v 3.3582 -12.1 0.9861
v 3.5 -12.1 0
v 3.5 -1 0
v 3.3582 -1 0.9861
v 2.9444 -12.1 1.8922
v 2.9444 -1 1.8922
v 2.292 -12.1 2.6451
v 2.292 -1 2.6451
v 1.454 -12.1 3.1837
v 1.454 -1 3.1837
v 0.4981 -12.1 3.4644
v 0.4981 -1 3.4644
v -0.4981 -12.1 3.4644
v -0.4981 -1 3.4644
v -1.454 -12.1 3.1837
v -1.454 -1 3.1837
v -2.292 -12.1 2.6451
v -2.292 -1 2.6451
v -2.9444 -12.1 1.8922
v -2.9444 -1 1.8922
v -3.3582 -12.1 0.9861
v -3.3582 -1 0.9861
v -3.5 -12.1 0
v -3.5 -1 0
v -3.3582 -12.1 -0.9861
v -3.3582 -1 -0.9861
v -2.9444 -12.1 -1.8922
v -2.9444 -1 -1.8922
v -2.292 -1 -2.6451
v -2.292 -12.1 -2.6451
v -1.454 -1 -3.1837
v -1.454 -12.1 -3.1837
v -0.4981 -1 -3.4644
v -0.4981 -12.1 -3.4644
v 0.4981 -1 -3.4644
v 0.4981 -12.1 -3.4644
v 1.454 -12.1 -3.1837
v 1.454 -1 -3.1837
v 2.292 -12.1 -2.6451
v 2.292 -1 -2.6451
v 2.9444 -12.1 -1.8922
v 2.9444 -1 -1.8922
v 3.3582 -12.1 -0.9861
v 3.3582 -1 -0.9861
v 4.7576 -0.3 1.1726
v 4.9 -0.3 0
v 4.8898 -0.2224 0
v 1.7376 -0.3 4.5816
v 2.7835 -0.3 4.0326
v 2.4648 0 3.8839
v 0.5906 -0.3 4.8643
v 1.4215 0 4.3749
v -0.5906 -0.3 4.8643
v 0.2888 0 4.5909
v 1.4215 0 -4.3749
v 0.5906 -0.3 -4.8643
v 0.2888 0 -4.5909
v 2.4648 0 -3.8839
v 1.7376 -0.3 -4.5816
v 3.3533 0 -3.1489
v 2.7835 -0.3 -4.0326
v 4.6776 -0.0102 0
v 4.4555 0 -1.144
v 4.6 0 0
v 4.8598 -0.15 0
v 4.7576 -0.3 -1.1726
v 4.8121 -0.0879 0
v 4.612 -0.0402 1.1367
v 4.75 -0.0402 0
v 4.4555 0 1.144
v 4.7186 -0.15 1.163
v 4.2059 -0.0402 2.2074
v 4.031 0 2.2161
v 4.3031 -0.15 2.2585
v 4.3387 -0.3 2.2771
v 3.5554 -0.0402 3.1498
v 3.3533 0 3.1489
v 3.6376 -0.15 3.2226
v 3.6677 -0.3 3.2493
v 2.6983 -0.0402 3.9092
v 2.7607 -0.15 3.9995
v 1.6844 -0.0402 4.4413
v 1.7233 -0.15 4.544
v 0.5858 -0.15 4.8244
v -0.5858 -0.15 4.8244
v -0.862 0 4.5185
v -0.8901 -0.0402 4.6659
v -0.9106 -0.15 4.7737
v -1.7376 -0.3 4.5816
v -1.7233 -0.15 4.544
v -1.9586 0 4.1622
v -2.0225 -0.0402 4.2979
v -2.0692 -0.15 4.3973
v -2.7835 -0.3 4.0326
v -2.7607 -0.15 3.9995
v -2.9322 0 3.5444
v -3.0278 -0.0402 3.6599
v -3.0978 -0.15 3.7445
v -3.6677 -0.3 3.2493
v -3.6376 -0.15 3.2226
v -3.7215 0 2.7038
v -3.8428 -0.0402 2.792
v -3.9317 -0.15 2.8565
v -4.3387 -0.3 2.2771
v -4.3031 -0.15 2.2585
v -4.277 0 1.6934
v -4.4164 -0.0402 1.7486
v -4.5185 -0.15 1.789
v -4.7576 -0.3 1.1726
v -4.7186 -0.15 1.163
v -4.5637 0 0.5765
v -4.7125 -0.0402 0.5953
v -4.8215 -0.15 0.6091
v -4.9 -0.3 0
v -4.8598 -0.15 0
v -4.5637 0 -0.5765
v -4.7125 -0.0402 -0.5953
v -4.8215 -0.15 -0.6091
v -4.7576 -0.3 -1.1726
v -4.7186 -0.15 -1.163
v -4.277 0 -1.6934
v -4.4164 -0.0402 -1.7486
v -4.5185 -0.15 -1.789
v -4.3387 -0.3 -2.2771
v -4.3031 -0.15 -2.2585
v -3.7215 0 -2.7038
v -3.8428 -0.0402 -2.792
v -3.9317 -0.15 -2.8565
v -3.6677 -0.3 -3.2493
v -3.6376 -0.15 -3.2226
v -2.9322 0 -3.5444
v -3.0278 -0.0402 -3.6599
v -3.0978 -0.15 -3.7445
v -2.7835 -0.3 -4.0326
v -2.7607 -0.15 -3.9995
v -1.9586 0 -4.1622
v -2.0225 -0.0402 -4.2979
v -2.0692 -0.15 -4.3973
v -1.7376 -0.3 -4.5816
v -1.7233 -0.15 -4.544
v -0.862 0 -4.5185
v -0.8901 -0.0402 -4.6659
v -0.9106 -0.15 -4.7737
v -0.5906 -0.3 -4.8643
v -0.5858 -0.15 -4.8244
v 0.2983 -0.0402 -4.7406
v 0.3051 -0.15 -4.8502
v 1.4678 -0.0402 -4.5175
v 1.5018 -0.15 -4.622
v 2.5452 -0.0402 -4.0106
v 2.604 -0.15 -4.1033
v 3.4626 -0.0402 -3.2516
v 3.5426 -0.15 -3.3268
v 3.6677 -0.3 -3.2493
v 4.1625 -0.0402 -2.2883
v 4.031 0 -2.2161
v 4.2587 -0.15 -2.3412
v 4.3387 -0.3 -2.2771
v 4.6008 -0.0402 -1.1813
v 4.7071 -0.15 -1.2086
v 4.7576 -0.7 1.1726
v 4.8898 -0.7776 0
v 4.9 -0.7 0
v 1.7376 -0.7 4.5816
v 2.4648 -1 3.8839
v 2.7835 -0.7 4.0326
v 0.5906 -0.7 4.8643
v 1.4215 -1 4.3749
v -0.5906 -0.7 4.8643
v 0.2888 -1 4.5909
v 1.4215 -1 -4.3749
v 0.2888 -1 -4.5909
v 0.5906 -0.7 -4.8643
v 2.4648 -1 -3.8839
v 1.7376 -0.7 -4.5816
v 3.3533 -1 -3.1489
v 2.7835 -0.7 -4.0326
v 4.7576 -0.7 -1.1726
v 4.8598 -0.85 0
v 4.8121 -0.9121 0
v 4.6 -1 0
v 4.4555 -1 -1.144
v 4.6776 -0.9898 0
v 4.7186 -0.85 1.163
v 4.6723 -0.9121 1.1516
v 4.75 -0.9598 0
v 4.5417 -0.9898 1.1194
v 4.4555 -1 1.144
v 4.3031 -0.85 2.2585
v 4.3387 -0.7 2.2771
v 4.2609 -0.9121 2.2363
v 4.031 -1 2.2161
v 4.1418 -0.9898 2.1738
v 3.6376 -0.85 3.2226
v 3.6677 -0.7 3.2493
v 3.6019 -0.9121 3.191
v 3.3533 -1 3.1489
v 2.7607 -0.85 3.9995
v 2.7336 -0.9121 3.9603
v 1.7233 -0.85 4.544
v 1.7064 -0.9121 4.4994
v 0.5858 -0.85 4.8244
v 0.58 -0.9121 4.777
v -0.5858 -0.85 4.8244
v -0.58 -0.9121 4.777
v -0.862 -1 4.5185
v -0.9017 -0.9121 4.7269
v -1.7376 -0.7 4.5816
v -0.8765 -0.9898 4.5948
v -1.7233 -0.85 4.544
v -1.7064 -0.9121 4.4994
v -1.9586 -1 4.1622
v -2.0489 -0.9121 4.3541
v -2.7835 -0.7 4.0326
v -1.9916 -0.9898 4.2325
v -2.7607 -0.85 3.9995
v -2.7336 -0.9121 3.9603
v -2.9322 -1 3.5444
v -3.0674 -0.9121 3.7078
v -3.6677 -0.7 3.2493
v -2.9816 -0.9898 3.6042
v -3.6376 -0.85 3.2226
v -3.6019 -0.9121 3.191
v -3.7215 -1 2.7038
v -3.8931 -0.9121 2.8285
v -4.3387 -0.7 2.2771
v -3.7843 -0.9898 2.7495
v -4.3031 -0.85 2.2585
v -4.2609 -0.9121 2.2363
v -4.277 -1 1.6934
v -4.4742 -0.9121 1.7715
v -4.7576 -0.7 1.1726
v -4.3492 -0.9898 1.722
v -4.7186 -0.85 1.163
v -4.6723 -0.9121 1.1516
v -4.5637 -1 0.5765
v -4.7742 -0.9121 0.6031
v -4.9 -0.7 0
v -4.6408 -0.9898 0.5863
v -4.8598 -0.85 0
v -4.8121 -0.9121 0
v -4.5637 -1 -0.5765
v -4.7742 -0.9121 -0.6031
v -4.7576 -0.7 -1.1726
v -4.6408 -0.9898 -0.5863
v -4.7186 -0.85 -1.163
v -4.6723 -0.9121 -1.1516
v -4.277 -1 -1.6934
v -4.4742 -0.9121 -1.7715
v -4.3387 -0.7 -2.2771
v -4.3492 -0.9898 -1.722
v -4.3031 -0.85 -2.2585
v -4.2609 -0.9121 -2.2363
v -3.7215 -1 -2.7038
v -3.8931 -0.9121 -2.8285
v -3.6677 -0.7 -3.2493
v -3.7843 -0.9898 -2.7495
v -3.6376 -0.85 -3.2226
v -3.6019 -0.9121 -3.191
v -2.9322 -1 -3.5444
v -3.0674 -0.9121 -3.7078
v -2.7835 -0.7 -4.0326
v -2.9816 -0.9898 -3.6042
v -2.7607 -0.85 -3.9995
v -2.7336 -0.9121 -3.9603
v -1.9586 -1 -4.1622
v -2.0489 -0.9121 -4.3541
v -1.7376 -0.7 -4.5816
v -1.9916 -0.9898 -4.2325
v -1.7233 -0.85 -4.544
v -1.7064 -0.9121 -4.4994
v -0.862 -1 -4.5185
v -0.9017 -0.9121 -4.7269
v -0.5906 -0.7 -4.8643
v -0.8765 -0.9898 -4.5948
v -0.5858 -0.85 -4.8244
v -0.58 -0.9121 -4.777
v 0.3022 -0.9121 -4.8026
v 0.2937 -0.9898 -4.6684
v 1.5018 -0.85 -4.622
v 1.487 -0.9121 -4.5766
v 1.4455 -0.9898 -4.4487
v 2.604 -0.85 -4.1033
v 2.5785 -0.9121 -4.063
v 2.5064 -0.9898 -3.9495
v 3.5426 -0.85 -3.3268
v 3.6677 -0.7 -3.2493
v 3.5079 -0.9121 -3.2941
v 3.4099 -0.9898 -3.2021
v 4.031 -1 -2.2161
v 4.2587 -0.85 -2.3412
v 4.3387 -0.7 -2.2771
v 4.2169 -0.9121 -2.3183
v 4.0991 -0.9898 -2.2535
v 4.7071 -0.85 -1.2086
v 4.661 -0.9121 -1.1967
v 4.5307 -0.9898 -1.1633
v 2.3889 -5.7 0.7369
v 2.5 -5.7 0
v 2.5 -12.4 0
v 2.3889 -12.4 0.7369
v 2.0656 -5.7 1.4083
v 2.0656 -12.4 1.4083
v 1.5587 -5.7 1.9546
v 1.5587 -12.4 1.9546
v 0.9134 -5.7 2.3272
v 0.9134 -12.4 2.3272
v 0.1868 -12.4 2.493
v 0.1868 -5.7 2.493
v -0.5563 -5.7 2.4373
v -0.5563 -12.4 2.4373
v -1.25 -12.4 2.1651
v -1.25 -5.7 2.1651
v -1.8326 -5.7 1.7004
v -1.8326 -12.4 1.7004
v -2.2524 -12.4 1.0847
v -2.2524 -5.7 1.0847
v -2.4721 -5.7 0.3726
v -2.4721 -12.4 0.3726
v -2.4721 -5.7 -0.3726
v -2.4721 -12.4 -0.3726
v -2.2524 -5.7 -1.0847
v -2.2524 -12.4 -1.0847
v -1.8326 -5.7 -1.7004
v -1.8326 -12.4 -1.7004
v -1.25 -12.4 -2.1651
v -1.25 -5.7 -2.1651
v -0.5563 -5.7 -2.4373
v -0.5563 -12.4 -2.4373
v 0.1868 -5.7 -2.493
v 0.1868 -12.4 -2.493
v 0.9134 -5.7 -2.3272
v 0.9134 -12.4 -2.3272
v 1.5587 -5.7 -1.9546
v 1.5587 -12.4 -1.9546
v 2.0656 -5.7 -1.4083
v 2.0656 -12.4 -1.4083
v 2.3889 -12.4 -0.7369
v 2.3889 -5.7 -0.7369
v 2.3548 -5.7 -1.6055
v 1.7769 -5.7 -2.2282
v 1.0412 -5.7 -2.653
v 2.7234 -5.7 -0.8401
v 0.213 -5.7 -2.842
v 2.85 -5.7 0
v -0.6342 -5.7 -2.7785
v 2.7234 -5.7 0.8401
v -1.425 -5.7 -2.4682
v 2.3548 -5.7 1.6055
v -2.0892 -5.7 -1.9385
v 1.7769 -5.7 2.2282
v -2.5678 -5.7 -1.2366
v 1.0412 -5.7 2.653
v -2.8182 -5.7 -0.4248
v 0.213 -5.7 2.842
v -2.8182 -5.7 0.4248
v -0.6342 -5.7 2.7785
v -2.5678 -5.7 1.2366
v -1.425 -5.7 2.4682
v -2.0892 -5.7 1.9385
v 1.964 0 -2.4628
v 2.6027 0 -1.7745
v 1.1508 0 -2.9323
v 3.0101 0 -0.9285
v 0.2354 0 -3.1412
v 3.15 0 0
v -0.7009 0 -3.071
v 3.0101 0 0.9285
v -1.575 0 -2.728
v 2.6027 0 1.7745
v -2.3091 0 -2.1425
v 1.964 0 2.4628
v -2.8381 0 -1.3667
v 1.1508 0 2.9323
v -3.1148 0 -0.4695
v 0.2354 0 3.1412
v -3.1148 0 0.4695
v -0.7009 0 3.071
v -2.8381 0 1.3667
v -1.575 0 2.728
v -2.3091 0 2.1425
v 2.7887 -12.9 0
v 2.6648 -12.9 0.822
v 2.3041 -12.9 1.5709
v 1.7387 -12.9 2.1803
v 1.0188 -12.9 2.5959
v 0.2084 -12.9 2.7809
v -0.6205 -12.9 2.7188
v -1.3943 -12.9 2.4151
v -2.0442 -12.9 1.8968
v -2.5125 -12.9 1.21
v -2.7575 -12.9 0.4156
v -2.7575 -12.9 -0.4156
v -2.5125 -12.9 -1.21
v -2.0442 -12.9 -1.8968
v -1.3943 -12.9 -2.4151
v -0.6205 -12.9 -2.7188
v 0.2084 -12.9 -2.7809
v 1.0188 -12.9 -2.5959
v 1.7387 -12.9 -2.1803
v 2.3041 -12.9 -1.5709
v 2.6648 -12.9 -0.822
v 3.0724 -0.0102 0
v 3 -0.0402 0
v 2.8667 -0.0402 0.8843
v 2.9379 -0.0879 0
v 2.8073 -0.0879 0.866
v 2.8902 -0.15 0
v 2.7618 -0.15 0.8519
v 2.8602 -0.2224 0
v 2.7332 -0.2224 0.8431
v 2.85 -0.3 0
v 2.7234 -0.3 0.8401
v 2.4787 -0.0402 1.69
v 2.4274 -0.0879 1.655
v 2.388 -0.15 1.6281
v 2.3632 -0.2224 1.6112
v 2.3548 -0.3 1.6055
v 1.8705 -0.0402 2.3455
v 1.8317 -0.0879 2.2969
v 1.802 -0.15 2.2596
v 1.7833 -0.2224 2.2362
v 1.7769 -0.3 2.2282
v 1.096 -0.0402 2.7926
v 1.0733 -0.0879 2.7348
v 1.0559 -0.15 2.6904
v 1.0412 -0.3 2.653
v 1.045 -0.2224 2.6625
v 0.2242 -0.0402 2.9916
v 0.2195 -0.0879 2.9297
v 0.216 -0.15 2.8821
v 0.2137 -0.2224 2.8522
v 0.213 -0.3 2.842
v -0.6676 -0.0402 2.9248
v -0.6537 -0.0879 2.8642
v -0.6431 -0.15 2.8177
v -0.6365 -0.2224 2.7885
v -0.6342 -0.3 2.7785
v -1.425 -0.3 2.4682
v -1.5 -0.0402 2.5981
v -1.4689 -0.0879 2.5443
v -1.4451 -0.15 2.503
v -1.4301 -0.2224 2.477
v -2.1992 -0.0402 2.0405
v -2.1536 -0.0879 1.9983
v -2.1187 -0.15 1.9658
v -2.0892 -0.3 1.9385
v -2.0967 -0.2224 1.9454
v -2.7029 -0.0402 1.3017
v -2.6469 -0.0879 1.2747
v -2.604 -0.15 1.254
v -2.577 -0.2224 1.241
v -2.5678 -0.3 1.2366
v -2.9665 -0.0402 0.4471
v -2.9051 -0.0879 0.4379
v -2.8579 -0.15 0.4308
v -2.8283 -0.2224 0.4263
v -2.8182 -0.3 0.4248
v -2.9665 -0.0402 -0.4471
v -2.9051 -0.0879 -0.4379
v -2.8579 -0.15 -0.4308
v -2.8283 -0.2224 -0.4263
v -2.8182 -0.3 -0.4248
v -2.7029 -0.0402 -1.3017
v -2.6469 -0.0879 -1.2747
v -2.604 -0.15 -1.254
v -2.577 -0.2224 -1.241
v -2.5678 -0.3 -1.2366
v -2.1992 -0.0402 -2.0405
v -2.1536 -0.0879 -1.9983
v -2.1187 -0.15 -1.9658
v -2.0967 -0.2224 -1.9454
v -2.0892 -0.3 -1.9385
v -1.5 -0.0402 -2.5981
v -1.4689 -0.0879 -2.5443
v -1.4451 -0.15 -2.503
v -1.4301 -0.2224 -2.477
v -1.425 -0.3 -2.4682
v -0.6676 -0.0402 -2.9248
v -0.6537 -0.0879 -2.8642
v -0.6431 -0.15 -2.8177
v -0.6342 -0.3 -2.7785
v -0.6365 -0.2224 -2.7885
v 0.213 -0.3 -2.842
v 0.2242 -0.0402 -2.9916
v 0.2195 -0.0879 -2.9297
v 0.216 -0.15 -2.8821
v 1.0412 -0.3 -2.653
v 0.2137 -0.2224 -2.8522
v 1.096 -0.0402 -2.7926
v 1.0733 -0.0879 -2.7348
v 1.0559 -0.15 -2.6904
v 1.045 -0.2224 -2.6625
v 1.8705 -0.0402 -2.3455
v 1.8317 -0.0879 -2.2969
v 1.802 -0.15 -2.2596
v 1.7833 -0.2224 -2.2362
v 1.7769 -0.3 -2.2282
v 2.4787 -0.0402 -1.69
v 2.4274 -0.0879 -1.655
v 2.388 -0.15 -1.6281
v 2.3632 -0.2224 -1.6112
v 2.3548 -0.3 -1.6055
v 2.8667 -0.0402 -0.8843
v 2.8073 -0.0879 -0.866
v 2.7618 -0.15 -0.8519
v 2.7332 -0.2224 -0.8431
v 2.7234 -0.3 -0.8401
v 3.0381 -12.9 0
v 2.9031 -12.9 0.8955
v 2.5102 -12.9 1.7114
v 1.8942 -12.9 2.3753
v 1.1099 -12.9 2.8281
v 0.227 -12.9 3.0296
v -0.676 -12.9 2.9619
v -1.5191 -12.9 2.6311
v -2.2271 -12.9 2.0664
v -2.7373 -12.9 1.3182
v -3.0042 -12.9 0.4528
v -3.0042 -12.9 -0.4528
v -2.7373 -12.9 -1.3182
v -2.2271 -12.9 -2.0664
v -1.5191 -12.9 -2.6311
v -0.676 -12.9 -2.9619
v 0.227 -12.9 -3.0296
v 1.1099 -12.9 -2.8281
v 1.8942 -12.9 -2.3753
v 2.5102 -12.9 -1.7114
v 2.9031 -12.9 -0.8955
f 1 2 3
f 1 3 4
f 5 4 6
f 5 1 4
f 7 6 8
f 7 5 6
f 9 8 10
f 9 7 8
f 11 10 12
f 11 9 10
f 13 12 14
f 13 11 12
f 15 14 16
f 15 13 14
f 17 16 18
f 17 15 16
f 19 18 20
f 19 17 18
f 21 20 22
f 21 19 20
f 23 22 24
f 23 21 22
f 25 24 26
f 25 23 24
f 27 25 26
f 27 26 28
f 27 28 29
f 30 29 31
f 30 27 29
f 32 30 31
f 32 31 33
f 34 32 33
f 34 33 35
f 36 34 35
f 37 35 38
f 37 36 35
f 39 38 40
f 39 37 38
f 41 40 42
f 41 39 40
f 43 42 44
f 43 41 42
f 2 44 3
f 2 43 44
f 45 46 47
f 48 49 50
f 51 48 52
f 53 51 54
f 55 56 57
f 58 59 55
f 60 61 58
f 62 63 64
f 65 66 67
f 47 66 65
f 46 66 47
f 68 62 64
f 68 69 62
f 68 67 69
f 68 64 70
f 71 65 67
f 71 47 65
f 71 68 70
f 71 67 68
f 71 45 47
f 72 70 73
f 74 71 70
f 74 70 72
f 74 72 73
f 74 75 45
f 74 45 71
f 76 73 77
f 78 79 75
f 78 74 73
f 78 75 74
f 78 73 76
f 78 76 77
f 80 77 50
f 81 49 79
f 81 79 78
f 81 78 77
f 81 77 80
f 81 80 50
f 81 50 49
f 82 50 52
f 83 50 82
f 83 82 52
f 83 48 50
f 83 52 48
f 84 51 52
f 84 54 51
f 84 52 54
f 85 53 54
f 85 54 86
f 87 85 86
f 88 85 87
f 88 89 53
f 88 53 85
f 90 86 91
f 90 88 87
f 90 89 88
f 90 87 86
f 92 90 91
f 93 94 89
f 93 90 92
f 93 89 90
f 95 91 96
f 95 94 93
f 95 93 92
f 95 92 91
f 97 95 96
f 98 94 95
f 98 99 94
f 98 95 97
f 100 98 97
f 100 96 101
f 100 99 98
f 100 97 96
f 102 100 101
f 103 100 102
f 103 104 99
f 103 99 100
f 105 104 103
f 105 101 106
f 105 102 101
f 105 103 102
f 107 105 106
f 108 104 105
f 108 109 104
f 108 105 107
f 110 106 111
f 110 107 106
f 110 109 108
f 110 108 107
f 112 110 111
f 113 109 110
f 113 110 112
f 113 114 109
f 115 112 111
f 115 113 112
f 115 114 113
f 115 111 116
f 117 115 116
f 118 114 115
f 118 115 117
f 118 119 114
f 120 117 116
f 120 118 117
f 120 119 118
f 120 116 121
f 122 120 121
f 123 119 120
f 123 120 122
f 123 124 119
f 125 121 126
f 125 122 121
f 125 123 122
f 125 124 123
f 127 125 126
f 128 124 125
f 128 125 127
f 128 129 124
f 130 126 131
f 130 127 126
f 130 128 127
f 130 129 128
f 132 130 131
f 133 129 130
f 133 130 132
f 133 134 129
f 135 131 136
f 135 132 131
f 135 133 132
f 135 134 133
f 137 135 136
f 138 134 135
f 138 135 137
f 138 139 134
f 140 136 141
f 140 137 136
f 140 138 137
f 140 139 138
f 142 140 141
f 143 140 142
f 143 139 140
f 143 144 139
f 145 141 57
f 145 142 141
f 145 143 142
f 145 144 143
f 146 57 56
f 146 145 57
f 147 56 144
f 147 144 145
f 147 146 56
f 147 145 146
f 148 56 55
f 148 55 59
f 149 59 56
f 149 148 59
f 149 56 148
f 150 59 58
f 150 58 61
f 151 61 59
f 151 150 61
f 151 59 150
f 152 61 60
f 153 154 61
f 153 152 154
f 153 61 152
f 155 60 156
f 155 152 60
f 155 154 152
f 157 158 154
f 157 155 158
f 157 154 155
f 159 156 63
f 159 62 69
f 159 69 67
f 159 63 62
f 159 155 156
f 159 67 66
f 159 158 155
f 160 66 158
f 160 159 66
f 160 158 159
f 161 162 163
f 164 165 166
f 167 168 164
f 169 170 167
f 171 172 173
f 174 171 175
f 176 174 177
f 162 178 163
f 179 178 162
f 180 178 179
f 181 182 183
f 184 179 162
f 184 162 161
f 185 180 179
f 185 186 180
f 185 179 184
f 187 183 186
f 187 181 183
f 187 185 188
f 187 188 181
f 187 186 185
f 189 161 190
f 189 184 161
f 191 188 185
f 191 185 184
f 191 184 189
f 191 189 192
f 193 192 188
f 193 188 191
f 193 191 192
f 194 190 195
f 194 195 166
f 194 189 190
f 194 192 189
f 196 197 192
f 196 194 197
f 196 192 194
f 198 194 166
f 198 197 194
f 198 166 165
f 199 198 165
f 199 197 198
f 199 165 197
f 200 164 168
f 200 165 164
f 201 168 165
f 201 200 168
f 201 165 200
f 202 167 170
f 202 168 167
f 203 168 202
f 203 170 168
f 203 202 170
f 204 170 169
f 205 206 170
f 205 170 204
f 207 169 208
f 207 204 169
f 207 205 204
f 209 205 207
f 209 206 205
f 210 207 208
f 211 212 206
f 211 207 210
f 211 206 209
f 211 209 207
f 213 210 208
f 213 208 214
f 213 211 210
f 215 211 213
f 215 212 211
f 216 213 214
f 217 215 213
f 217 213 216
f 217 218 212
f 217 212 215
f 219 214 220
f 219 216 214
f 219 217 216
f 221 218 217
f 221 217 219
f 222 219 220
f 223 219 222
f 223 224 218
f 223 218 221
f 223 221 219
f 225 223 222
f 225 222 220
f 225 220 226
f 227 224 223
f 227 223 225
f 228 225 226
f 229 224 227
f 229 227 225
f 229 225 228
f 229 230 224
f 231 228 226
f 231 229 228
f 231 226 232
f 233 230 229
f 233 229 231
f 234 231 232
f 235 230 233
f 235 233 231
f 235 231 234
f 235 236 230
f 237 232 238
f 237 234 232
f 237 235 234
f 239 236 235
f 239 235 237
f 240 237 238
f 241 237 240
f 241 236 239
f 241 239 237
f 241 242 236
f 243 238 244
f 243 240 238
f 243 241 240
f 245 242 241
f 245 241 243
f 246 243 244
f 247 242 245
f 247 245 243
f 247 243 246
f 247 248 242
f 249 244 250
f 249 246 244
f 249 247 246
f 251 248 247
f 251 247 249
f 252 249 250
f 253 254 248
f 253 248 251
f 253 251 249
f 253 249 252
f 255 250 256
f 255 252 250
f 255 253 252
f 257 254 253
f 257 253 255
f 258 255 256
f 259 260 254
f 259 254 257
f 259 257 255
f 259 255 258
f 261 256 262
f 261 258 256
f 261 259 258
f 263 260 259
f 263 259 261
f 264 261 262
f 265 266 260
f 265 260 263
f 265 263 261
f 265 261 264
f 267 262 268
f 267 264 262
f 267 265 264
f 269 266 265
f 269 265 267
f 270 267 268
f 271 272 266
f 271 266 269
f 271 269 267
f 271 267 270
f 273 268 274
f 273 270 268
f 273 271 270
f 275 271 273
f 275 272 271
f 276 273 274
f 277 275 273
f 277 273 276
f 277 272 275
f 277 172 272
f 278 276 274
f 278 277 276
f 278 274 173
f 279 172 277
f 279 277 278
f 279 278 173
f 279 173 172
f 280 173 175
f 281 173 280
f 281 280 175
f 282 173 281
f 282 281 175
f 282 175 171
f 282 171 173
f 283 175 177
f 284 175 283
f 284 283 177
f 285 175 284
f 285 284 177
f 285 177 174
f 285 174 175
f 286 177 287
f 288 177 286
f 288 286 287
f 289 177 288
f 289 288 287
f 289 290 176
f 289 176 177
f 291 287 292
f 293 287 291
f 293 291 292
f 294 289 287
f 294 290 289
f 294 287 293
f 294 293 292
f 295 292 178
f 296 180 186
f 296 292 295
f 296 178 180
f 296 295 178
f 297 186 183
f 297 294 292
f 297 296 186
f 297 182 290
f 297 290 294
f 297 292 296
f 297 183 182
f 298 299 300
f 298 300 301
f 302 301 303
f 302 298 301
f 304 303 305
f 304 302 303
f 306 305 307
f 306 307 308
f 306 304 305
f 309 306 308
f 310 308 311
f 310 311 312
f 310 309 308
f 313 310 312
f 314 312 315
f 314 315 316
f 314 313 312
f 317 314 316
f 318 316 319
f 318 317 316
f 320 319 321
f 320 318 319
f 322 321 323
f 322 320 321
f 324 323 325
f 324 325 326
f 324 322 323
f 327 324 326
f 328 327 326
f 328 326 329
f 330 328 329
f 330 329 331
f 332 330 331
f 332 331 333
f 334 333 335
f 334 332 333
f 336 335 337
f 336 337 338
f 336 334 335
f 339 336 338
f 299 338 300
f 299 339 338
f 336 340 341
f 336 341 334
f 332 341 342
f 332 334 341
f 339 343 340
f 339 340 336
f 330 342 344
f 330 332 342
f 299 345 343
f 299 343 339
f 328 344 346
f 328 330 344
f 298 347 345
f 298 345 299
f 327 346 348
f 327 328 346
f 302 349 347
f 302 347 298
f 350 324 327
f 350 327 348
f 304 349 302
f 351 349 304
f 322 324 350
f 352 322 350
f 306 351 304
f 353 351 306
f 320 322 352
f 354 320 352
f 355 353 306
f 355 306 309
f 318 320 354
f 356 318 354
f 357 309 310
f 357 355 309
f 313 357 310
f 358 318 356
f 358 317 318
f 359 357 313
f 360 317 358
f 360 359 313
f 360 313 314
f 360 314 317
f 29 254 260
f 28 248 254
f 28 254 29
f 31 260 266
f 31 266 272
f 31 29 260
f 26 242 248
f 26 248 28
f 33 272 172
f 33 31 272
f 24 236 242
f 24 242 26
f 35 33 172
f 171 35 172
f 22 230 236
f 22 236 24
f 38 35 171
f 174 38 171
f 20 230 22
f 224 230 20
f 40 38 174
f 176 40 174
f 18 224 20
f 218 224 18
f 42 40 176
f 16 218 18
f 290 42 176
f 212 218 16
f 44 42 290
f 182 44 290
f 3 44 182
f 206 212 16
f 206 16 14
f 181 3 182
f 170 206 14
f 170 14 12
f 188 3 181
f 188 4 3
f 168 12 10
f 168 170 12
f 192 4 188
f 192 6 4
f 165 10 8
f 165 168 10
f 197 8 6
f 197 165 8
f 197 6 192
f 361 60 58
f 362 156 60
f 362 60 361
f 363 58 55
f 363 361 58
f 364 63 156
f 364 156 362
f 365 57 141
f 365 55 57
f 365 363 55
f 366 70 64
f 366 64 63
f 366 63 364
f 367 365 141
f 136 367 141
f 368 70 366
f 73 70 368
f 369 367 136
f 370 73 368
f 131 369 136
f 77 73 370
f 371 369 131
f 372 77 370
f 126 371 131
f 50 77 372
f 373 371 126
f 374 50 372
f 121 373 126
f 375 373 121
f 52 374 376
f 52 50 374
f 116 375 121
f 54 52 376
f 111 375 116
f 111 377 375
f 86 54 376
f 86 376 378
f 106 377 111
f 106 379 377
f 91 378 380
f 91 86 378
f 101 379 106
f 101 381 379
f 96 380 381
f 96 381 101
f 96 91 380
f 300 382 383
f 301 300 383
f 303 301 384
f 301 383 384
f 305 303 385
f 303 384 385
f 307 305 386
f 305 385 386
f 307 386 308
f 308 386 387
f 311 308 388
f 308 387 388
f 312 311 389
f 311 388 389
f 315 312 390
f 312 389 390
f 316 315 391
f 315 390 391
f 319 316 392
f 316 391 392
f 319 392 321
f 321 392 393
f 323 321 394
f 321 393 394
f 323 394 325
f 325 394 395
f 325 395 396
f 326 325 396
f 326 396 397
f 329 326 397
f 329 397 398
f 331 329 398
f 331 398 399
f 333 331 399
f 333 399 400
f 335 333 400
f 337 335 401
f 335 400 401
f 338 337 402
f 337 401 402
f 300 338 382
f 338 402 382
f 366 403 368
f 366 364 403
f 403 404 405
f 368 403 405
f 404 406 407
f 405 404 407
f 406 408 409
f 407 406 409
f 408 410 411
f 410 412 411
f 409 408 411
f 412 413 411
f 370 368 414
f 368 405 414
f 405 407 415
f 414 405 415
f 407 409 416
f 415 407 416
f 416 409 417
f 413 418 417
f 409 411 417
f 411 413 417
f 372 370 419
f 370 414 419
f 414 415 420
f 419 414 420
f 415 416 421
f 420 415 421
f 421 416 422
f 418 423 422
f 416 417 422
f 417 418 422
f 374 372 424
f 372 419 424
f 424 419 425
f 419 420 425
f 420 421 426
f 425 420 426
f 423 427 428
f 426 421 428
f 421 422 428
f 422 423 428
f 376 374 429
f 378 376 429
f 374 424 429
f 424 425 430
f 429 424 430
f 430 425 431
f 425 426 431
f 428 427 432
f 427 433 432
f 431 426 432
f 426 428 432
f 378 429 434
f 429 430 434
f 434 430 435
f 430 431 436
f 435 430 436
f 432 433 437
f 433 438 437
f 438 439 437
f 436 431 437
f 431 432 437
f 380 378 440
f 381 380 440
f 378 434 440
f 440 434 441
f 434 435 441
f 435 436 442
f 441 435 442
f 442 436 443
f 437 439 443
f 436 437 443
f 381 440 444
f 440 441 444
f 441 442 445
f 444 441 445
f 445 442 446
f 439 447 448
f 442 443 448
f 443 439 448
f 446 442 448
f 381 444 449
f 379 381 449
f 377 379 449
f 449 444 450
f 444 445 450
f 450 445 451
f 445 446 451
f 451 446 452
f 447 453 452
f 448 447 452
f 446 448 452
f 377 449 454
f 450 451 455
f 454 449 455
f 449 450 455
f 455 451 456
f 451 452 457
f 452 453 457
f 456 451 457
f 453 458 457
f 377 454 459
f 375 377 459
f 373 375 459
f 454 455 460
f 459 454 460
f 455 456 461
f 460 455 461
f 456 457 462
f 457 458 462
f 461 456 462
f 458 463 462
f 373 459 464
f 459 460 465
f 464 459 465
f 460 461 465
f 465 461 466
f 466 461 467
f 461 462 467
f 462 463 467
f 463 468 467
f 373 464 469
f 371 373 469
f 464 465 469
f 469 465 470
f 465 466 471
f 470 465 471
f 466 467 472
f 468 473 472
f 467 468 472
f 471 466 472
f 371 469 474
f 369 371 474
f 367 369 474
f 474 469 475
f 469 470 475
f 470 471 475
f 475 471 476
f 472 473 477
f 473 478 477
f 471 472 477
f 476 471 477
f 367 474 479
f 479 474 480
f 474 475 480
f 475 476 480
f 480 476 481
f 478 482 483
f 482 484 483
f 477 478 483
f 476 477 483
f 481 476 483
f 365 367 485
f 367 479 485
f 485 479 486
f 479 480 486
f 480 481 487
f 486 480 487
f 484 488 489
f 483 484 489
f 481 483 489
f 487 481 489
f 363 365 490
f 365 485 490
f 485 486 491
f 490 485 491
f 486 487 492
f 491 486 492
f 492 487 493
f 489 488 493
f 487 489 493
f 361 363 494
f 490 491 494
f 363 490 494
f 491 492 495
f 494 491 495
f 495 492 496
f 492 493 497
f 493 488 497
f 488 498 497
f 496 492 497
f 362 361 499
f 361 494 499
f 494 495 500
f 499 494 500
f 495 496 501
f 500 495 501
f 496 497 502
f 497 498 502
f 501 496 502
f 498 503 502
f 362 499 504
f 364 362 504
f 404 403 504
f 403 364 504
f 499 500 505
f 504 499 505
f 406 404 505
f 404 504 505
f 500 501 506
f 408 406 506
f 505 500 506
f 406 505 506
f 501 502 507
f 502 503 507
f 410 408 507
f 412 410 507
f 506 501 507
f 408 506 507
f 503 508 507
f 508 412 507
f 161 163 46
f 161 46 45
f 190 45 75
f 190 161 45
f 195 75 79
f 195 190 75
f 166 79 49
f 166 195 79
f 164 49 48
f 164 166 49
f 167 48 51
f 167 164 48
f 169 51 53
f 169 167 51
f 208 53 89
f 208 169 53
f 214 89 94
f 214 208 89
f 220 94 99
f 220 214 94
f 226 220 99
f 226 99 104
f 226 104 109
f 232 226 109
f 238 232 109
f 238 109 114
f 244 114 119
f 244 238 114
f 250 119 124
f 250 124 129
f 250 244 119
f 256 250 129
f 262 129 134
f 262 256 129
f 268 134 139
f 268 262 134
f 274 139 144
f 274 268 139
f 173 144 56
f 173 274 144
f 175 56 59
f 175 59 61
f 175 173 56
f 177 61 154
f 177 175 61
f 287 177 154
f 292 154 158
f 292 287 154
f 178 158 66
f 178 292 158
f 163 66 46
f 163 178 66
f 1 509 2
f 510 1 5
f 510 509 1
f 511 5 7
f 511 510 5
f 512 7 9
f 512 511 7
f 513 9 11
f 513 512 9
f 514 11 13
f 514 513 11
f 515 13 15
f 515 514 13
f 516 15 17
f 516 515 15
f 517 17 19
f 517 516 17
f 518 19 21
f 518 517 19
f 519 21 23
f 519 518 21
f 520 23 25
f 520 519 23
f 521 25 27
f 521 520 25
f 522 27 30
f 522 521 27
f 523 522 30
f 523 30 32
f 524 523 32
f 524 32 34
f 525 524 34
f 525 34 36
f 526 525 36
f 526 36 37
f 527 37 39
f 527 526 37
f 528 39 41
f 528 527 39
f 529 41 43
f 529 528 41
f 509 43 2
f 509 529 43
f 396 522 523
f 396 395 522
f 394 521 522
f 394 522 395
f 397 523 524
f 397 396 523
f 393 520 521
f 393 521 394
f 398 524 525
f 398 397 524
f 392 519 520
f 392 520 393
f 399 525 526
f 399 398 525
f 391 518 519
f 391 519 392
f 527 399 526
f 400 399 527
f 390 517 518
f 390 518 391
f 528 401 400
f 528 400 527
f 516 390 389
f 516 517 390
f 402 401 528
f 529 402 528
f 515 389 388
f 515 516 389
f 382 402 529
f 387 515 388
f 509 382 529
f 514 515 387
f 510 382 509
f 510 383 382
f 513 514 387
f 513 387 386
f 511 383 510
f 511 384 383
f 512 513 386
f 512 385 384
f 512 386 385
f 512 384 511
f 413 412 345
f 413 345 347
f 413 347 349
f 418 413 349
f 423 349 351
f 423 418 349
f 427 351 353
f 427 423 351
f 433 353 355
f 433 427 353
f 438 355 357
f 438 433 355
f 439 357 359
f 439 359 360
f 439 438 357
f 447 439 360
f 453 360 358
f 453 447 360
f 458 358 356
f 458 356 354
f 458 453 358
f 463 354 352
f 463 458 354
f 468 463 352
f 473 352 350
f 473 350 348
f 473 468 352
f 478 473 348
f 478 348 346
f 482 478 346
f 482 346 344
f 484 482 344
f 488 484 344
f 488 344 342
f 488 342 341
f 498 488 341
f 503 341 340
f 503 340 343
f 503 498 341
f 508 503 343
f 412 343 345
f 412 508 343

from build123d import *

# Parameters (mm, degrees)
FILLET1_R      = 0.3
CHAMFER1_SIZE  = 0.8
CHAMFER1_SIZE2 = 0.461880215
CHAMFER2_SIZE  = 0.5
CHAMFER2_SIZE2 = 0.288675135


with BuildPart() as part:
    # Sketch1 → Revolve1 (revolve)
    with BuildSketch(Plane.XY):
        Polygon((2.85, 0), (4.9, 0), (4.9, -1), (3.5, -1), (3.5, -12.9), (2.5, -12.9), (2.5, -5.7), (2.85, -5.7), align=None)
    revolve(axis=Axis((0, 0, 0), (0, -1, 0)))

    # Fillet1
    fillet1_edges = [part.edges().sort_by_distance(p)[0] for p in [
        (-4.9, -1, 0),
        (-4.9, 0, 0),
        (-2.85, 0, 0),
    ]]
    fillet(fillet1_edges, radius=FILLET1_R)

    # Chamfer1
    chamfer1_edges = [part.edges().sort_by_distance(p)[0] for p in [
        (-3.5, -12.9, 0),
    ]]
    chamfer1_side = [part.faces().sort_by_distance(p)[0] for p in [
        (-3.5, -6.95, 0),
    ]]
    chamfer(chamfer1_edges, length=CHAMFER1_SIZE, length2=CHAMFER1_SIZE2, reference=chamfer1_side[0])

    # Chamfer2
    chamfer2_edges = [part.edges().sort_by_distance(p)[0] for p in [
        (-2.5, -12.9, 0),
    ]]
    chamfer2_side = [part.faces().sort_by_distance(p)[0] for p in [
        (-2.5, -9.3, 0),
    ]]
    chamfer(chamfer2_edges, length=CHAMFER2_SIZE, length2=CHAMFER2_SIZE2, reference=chamfer2_side[0])


solid = part.part
